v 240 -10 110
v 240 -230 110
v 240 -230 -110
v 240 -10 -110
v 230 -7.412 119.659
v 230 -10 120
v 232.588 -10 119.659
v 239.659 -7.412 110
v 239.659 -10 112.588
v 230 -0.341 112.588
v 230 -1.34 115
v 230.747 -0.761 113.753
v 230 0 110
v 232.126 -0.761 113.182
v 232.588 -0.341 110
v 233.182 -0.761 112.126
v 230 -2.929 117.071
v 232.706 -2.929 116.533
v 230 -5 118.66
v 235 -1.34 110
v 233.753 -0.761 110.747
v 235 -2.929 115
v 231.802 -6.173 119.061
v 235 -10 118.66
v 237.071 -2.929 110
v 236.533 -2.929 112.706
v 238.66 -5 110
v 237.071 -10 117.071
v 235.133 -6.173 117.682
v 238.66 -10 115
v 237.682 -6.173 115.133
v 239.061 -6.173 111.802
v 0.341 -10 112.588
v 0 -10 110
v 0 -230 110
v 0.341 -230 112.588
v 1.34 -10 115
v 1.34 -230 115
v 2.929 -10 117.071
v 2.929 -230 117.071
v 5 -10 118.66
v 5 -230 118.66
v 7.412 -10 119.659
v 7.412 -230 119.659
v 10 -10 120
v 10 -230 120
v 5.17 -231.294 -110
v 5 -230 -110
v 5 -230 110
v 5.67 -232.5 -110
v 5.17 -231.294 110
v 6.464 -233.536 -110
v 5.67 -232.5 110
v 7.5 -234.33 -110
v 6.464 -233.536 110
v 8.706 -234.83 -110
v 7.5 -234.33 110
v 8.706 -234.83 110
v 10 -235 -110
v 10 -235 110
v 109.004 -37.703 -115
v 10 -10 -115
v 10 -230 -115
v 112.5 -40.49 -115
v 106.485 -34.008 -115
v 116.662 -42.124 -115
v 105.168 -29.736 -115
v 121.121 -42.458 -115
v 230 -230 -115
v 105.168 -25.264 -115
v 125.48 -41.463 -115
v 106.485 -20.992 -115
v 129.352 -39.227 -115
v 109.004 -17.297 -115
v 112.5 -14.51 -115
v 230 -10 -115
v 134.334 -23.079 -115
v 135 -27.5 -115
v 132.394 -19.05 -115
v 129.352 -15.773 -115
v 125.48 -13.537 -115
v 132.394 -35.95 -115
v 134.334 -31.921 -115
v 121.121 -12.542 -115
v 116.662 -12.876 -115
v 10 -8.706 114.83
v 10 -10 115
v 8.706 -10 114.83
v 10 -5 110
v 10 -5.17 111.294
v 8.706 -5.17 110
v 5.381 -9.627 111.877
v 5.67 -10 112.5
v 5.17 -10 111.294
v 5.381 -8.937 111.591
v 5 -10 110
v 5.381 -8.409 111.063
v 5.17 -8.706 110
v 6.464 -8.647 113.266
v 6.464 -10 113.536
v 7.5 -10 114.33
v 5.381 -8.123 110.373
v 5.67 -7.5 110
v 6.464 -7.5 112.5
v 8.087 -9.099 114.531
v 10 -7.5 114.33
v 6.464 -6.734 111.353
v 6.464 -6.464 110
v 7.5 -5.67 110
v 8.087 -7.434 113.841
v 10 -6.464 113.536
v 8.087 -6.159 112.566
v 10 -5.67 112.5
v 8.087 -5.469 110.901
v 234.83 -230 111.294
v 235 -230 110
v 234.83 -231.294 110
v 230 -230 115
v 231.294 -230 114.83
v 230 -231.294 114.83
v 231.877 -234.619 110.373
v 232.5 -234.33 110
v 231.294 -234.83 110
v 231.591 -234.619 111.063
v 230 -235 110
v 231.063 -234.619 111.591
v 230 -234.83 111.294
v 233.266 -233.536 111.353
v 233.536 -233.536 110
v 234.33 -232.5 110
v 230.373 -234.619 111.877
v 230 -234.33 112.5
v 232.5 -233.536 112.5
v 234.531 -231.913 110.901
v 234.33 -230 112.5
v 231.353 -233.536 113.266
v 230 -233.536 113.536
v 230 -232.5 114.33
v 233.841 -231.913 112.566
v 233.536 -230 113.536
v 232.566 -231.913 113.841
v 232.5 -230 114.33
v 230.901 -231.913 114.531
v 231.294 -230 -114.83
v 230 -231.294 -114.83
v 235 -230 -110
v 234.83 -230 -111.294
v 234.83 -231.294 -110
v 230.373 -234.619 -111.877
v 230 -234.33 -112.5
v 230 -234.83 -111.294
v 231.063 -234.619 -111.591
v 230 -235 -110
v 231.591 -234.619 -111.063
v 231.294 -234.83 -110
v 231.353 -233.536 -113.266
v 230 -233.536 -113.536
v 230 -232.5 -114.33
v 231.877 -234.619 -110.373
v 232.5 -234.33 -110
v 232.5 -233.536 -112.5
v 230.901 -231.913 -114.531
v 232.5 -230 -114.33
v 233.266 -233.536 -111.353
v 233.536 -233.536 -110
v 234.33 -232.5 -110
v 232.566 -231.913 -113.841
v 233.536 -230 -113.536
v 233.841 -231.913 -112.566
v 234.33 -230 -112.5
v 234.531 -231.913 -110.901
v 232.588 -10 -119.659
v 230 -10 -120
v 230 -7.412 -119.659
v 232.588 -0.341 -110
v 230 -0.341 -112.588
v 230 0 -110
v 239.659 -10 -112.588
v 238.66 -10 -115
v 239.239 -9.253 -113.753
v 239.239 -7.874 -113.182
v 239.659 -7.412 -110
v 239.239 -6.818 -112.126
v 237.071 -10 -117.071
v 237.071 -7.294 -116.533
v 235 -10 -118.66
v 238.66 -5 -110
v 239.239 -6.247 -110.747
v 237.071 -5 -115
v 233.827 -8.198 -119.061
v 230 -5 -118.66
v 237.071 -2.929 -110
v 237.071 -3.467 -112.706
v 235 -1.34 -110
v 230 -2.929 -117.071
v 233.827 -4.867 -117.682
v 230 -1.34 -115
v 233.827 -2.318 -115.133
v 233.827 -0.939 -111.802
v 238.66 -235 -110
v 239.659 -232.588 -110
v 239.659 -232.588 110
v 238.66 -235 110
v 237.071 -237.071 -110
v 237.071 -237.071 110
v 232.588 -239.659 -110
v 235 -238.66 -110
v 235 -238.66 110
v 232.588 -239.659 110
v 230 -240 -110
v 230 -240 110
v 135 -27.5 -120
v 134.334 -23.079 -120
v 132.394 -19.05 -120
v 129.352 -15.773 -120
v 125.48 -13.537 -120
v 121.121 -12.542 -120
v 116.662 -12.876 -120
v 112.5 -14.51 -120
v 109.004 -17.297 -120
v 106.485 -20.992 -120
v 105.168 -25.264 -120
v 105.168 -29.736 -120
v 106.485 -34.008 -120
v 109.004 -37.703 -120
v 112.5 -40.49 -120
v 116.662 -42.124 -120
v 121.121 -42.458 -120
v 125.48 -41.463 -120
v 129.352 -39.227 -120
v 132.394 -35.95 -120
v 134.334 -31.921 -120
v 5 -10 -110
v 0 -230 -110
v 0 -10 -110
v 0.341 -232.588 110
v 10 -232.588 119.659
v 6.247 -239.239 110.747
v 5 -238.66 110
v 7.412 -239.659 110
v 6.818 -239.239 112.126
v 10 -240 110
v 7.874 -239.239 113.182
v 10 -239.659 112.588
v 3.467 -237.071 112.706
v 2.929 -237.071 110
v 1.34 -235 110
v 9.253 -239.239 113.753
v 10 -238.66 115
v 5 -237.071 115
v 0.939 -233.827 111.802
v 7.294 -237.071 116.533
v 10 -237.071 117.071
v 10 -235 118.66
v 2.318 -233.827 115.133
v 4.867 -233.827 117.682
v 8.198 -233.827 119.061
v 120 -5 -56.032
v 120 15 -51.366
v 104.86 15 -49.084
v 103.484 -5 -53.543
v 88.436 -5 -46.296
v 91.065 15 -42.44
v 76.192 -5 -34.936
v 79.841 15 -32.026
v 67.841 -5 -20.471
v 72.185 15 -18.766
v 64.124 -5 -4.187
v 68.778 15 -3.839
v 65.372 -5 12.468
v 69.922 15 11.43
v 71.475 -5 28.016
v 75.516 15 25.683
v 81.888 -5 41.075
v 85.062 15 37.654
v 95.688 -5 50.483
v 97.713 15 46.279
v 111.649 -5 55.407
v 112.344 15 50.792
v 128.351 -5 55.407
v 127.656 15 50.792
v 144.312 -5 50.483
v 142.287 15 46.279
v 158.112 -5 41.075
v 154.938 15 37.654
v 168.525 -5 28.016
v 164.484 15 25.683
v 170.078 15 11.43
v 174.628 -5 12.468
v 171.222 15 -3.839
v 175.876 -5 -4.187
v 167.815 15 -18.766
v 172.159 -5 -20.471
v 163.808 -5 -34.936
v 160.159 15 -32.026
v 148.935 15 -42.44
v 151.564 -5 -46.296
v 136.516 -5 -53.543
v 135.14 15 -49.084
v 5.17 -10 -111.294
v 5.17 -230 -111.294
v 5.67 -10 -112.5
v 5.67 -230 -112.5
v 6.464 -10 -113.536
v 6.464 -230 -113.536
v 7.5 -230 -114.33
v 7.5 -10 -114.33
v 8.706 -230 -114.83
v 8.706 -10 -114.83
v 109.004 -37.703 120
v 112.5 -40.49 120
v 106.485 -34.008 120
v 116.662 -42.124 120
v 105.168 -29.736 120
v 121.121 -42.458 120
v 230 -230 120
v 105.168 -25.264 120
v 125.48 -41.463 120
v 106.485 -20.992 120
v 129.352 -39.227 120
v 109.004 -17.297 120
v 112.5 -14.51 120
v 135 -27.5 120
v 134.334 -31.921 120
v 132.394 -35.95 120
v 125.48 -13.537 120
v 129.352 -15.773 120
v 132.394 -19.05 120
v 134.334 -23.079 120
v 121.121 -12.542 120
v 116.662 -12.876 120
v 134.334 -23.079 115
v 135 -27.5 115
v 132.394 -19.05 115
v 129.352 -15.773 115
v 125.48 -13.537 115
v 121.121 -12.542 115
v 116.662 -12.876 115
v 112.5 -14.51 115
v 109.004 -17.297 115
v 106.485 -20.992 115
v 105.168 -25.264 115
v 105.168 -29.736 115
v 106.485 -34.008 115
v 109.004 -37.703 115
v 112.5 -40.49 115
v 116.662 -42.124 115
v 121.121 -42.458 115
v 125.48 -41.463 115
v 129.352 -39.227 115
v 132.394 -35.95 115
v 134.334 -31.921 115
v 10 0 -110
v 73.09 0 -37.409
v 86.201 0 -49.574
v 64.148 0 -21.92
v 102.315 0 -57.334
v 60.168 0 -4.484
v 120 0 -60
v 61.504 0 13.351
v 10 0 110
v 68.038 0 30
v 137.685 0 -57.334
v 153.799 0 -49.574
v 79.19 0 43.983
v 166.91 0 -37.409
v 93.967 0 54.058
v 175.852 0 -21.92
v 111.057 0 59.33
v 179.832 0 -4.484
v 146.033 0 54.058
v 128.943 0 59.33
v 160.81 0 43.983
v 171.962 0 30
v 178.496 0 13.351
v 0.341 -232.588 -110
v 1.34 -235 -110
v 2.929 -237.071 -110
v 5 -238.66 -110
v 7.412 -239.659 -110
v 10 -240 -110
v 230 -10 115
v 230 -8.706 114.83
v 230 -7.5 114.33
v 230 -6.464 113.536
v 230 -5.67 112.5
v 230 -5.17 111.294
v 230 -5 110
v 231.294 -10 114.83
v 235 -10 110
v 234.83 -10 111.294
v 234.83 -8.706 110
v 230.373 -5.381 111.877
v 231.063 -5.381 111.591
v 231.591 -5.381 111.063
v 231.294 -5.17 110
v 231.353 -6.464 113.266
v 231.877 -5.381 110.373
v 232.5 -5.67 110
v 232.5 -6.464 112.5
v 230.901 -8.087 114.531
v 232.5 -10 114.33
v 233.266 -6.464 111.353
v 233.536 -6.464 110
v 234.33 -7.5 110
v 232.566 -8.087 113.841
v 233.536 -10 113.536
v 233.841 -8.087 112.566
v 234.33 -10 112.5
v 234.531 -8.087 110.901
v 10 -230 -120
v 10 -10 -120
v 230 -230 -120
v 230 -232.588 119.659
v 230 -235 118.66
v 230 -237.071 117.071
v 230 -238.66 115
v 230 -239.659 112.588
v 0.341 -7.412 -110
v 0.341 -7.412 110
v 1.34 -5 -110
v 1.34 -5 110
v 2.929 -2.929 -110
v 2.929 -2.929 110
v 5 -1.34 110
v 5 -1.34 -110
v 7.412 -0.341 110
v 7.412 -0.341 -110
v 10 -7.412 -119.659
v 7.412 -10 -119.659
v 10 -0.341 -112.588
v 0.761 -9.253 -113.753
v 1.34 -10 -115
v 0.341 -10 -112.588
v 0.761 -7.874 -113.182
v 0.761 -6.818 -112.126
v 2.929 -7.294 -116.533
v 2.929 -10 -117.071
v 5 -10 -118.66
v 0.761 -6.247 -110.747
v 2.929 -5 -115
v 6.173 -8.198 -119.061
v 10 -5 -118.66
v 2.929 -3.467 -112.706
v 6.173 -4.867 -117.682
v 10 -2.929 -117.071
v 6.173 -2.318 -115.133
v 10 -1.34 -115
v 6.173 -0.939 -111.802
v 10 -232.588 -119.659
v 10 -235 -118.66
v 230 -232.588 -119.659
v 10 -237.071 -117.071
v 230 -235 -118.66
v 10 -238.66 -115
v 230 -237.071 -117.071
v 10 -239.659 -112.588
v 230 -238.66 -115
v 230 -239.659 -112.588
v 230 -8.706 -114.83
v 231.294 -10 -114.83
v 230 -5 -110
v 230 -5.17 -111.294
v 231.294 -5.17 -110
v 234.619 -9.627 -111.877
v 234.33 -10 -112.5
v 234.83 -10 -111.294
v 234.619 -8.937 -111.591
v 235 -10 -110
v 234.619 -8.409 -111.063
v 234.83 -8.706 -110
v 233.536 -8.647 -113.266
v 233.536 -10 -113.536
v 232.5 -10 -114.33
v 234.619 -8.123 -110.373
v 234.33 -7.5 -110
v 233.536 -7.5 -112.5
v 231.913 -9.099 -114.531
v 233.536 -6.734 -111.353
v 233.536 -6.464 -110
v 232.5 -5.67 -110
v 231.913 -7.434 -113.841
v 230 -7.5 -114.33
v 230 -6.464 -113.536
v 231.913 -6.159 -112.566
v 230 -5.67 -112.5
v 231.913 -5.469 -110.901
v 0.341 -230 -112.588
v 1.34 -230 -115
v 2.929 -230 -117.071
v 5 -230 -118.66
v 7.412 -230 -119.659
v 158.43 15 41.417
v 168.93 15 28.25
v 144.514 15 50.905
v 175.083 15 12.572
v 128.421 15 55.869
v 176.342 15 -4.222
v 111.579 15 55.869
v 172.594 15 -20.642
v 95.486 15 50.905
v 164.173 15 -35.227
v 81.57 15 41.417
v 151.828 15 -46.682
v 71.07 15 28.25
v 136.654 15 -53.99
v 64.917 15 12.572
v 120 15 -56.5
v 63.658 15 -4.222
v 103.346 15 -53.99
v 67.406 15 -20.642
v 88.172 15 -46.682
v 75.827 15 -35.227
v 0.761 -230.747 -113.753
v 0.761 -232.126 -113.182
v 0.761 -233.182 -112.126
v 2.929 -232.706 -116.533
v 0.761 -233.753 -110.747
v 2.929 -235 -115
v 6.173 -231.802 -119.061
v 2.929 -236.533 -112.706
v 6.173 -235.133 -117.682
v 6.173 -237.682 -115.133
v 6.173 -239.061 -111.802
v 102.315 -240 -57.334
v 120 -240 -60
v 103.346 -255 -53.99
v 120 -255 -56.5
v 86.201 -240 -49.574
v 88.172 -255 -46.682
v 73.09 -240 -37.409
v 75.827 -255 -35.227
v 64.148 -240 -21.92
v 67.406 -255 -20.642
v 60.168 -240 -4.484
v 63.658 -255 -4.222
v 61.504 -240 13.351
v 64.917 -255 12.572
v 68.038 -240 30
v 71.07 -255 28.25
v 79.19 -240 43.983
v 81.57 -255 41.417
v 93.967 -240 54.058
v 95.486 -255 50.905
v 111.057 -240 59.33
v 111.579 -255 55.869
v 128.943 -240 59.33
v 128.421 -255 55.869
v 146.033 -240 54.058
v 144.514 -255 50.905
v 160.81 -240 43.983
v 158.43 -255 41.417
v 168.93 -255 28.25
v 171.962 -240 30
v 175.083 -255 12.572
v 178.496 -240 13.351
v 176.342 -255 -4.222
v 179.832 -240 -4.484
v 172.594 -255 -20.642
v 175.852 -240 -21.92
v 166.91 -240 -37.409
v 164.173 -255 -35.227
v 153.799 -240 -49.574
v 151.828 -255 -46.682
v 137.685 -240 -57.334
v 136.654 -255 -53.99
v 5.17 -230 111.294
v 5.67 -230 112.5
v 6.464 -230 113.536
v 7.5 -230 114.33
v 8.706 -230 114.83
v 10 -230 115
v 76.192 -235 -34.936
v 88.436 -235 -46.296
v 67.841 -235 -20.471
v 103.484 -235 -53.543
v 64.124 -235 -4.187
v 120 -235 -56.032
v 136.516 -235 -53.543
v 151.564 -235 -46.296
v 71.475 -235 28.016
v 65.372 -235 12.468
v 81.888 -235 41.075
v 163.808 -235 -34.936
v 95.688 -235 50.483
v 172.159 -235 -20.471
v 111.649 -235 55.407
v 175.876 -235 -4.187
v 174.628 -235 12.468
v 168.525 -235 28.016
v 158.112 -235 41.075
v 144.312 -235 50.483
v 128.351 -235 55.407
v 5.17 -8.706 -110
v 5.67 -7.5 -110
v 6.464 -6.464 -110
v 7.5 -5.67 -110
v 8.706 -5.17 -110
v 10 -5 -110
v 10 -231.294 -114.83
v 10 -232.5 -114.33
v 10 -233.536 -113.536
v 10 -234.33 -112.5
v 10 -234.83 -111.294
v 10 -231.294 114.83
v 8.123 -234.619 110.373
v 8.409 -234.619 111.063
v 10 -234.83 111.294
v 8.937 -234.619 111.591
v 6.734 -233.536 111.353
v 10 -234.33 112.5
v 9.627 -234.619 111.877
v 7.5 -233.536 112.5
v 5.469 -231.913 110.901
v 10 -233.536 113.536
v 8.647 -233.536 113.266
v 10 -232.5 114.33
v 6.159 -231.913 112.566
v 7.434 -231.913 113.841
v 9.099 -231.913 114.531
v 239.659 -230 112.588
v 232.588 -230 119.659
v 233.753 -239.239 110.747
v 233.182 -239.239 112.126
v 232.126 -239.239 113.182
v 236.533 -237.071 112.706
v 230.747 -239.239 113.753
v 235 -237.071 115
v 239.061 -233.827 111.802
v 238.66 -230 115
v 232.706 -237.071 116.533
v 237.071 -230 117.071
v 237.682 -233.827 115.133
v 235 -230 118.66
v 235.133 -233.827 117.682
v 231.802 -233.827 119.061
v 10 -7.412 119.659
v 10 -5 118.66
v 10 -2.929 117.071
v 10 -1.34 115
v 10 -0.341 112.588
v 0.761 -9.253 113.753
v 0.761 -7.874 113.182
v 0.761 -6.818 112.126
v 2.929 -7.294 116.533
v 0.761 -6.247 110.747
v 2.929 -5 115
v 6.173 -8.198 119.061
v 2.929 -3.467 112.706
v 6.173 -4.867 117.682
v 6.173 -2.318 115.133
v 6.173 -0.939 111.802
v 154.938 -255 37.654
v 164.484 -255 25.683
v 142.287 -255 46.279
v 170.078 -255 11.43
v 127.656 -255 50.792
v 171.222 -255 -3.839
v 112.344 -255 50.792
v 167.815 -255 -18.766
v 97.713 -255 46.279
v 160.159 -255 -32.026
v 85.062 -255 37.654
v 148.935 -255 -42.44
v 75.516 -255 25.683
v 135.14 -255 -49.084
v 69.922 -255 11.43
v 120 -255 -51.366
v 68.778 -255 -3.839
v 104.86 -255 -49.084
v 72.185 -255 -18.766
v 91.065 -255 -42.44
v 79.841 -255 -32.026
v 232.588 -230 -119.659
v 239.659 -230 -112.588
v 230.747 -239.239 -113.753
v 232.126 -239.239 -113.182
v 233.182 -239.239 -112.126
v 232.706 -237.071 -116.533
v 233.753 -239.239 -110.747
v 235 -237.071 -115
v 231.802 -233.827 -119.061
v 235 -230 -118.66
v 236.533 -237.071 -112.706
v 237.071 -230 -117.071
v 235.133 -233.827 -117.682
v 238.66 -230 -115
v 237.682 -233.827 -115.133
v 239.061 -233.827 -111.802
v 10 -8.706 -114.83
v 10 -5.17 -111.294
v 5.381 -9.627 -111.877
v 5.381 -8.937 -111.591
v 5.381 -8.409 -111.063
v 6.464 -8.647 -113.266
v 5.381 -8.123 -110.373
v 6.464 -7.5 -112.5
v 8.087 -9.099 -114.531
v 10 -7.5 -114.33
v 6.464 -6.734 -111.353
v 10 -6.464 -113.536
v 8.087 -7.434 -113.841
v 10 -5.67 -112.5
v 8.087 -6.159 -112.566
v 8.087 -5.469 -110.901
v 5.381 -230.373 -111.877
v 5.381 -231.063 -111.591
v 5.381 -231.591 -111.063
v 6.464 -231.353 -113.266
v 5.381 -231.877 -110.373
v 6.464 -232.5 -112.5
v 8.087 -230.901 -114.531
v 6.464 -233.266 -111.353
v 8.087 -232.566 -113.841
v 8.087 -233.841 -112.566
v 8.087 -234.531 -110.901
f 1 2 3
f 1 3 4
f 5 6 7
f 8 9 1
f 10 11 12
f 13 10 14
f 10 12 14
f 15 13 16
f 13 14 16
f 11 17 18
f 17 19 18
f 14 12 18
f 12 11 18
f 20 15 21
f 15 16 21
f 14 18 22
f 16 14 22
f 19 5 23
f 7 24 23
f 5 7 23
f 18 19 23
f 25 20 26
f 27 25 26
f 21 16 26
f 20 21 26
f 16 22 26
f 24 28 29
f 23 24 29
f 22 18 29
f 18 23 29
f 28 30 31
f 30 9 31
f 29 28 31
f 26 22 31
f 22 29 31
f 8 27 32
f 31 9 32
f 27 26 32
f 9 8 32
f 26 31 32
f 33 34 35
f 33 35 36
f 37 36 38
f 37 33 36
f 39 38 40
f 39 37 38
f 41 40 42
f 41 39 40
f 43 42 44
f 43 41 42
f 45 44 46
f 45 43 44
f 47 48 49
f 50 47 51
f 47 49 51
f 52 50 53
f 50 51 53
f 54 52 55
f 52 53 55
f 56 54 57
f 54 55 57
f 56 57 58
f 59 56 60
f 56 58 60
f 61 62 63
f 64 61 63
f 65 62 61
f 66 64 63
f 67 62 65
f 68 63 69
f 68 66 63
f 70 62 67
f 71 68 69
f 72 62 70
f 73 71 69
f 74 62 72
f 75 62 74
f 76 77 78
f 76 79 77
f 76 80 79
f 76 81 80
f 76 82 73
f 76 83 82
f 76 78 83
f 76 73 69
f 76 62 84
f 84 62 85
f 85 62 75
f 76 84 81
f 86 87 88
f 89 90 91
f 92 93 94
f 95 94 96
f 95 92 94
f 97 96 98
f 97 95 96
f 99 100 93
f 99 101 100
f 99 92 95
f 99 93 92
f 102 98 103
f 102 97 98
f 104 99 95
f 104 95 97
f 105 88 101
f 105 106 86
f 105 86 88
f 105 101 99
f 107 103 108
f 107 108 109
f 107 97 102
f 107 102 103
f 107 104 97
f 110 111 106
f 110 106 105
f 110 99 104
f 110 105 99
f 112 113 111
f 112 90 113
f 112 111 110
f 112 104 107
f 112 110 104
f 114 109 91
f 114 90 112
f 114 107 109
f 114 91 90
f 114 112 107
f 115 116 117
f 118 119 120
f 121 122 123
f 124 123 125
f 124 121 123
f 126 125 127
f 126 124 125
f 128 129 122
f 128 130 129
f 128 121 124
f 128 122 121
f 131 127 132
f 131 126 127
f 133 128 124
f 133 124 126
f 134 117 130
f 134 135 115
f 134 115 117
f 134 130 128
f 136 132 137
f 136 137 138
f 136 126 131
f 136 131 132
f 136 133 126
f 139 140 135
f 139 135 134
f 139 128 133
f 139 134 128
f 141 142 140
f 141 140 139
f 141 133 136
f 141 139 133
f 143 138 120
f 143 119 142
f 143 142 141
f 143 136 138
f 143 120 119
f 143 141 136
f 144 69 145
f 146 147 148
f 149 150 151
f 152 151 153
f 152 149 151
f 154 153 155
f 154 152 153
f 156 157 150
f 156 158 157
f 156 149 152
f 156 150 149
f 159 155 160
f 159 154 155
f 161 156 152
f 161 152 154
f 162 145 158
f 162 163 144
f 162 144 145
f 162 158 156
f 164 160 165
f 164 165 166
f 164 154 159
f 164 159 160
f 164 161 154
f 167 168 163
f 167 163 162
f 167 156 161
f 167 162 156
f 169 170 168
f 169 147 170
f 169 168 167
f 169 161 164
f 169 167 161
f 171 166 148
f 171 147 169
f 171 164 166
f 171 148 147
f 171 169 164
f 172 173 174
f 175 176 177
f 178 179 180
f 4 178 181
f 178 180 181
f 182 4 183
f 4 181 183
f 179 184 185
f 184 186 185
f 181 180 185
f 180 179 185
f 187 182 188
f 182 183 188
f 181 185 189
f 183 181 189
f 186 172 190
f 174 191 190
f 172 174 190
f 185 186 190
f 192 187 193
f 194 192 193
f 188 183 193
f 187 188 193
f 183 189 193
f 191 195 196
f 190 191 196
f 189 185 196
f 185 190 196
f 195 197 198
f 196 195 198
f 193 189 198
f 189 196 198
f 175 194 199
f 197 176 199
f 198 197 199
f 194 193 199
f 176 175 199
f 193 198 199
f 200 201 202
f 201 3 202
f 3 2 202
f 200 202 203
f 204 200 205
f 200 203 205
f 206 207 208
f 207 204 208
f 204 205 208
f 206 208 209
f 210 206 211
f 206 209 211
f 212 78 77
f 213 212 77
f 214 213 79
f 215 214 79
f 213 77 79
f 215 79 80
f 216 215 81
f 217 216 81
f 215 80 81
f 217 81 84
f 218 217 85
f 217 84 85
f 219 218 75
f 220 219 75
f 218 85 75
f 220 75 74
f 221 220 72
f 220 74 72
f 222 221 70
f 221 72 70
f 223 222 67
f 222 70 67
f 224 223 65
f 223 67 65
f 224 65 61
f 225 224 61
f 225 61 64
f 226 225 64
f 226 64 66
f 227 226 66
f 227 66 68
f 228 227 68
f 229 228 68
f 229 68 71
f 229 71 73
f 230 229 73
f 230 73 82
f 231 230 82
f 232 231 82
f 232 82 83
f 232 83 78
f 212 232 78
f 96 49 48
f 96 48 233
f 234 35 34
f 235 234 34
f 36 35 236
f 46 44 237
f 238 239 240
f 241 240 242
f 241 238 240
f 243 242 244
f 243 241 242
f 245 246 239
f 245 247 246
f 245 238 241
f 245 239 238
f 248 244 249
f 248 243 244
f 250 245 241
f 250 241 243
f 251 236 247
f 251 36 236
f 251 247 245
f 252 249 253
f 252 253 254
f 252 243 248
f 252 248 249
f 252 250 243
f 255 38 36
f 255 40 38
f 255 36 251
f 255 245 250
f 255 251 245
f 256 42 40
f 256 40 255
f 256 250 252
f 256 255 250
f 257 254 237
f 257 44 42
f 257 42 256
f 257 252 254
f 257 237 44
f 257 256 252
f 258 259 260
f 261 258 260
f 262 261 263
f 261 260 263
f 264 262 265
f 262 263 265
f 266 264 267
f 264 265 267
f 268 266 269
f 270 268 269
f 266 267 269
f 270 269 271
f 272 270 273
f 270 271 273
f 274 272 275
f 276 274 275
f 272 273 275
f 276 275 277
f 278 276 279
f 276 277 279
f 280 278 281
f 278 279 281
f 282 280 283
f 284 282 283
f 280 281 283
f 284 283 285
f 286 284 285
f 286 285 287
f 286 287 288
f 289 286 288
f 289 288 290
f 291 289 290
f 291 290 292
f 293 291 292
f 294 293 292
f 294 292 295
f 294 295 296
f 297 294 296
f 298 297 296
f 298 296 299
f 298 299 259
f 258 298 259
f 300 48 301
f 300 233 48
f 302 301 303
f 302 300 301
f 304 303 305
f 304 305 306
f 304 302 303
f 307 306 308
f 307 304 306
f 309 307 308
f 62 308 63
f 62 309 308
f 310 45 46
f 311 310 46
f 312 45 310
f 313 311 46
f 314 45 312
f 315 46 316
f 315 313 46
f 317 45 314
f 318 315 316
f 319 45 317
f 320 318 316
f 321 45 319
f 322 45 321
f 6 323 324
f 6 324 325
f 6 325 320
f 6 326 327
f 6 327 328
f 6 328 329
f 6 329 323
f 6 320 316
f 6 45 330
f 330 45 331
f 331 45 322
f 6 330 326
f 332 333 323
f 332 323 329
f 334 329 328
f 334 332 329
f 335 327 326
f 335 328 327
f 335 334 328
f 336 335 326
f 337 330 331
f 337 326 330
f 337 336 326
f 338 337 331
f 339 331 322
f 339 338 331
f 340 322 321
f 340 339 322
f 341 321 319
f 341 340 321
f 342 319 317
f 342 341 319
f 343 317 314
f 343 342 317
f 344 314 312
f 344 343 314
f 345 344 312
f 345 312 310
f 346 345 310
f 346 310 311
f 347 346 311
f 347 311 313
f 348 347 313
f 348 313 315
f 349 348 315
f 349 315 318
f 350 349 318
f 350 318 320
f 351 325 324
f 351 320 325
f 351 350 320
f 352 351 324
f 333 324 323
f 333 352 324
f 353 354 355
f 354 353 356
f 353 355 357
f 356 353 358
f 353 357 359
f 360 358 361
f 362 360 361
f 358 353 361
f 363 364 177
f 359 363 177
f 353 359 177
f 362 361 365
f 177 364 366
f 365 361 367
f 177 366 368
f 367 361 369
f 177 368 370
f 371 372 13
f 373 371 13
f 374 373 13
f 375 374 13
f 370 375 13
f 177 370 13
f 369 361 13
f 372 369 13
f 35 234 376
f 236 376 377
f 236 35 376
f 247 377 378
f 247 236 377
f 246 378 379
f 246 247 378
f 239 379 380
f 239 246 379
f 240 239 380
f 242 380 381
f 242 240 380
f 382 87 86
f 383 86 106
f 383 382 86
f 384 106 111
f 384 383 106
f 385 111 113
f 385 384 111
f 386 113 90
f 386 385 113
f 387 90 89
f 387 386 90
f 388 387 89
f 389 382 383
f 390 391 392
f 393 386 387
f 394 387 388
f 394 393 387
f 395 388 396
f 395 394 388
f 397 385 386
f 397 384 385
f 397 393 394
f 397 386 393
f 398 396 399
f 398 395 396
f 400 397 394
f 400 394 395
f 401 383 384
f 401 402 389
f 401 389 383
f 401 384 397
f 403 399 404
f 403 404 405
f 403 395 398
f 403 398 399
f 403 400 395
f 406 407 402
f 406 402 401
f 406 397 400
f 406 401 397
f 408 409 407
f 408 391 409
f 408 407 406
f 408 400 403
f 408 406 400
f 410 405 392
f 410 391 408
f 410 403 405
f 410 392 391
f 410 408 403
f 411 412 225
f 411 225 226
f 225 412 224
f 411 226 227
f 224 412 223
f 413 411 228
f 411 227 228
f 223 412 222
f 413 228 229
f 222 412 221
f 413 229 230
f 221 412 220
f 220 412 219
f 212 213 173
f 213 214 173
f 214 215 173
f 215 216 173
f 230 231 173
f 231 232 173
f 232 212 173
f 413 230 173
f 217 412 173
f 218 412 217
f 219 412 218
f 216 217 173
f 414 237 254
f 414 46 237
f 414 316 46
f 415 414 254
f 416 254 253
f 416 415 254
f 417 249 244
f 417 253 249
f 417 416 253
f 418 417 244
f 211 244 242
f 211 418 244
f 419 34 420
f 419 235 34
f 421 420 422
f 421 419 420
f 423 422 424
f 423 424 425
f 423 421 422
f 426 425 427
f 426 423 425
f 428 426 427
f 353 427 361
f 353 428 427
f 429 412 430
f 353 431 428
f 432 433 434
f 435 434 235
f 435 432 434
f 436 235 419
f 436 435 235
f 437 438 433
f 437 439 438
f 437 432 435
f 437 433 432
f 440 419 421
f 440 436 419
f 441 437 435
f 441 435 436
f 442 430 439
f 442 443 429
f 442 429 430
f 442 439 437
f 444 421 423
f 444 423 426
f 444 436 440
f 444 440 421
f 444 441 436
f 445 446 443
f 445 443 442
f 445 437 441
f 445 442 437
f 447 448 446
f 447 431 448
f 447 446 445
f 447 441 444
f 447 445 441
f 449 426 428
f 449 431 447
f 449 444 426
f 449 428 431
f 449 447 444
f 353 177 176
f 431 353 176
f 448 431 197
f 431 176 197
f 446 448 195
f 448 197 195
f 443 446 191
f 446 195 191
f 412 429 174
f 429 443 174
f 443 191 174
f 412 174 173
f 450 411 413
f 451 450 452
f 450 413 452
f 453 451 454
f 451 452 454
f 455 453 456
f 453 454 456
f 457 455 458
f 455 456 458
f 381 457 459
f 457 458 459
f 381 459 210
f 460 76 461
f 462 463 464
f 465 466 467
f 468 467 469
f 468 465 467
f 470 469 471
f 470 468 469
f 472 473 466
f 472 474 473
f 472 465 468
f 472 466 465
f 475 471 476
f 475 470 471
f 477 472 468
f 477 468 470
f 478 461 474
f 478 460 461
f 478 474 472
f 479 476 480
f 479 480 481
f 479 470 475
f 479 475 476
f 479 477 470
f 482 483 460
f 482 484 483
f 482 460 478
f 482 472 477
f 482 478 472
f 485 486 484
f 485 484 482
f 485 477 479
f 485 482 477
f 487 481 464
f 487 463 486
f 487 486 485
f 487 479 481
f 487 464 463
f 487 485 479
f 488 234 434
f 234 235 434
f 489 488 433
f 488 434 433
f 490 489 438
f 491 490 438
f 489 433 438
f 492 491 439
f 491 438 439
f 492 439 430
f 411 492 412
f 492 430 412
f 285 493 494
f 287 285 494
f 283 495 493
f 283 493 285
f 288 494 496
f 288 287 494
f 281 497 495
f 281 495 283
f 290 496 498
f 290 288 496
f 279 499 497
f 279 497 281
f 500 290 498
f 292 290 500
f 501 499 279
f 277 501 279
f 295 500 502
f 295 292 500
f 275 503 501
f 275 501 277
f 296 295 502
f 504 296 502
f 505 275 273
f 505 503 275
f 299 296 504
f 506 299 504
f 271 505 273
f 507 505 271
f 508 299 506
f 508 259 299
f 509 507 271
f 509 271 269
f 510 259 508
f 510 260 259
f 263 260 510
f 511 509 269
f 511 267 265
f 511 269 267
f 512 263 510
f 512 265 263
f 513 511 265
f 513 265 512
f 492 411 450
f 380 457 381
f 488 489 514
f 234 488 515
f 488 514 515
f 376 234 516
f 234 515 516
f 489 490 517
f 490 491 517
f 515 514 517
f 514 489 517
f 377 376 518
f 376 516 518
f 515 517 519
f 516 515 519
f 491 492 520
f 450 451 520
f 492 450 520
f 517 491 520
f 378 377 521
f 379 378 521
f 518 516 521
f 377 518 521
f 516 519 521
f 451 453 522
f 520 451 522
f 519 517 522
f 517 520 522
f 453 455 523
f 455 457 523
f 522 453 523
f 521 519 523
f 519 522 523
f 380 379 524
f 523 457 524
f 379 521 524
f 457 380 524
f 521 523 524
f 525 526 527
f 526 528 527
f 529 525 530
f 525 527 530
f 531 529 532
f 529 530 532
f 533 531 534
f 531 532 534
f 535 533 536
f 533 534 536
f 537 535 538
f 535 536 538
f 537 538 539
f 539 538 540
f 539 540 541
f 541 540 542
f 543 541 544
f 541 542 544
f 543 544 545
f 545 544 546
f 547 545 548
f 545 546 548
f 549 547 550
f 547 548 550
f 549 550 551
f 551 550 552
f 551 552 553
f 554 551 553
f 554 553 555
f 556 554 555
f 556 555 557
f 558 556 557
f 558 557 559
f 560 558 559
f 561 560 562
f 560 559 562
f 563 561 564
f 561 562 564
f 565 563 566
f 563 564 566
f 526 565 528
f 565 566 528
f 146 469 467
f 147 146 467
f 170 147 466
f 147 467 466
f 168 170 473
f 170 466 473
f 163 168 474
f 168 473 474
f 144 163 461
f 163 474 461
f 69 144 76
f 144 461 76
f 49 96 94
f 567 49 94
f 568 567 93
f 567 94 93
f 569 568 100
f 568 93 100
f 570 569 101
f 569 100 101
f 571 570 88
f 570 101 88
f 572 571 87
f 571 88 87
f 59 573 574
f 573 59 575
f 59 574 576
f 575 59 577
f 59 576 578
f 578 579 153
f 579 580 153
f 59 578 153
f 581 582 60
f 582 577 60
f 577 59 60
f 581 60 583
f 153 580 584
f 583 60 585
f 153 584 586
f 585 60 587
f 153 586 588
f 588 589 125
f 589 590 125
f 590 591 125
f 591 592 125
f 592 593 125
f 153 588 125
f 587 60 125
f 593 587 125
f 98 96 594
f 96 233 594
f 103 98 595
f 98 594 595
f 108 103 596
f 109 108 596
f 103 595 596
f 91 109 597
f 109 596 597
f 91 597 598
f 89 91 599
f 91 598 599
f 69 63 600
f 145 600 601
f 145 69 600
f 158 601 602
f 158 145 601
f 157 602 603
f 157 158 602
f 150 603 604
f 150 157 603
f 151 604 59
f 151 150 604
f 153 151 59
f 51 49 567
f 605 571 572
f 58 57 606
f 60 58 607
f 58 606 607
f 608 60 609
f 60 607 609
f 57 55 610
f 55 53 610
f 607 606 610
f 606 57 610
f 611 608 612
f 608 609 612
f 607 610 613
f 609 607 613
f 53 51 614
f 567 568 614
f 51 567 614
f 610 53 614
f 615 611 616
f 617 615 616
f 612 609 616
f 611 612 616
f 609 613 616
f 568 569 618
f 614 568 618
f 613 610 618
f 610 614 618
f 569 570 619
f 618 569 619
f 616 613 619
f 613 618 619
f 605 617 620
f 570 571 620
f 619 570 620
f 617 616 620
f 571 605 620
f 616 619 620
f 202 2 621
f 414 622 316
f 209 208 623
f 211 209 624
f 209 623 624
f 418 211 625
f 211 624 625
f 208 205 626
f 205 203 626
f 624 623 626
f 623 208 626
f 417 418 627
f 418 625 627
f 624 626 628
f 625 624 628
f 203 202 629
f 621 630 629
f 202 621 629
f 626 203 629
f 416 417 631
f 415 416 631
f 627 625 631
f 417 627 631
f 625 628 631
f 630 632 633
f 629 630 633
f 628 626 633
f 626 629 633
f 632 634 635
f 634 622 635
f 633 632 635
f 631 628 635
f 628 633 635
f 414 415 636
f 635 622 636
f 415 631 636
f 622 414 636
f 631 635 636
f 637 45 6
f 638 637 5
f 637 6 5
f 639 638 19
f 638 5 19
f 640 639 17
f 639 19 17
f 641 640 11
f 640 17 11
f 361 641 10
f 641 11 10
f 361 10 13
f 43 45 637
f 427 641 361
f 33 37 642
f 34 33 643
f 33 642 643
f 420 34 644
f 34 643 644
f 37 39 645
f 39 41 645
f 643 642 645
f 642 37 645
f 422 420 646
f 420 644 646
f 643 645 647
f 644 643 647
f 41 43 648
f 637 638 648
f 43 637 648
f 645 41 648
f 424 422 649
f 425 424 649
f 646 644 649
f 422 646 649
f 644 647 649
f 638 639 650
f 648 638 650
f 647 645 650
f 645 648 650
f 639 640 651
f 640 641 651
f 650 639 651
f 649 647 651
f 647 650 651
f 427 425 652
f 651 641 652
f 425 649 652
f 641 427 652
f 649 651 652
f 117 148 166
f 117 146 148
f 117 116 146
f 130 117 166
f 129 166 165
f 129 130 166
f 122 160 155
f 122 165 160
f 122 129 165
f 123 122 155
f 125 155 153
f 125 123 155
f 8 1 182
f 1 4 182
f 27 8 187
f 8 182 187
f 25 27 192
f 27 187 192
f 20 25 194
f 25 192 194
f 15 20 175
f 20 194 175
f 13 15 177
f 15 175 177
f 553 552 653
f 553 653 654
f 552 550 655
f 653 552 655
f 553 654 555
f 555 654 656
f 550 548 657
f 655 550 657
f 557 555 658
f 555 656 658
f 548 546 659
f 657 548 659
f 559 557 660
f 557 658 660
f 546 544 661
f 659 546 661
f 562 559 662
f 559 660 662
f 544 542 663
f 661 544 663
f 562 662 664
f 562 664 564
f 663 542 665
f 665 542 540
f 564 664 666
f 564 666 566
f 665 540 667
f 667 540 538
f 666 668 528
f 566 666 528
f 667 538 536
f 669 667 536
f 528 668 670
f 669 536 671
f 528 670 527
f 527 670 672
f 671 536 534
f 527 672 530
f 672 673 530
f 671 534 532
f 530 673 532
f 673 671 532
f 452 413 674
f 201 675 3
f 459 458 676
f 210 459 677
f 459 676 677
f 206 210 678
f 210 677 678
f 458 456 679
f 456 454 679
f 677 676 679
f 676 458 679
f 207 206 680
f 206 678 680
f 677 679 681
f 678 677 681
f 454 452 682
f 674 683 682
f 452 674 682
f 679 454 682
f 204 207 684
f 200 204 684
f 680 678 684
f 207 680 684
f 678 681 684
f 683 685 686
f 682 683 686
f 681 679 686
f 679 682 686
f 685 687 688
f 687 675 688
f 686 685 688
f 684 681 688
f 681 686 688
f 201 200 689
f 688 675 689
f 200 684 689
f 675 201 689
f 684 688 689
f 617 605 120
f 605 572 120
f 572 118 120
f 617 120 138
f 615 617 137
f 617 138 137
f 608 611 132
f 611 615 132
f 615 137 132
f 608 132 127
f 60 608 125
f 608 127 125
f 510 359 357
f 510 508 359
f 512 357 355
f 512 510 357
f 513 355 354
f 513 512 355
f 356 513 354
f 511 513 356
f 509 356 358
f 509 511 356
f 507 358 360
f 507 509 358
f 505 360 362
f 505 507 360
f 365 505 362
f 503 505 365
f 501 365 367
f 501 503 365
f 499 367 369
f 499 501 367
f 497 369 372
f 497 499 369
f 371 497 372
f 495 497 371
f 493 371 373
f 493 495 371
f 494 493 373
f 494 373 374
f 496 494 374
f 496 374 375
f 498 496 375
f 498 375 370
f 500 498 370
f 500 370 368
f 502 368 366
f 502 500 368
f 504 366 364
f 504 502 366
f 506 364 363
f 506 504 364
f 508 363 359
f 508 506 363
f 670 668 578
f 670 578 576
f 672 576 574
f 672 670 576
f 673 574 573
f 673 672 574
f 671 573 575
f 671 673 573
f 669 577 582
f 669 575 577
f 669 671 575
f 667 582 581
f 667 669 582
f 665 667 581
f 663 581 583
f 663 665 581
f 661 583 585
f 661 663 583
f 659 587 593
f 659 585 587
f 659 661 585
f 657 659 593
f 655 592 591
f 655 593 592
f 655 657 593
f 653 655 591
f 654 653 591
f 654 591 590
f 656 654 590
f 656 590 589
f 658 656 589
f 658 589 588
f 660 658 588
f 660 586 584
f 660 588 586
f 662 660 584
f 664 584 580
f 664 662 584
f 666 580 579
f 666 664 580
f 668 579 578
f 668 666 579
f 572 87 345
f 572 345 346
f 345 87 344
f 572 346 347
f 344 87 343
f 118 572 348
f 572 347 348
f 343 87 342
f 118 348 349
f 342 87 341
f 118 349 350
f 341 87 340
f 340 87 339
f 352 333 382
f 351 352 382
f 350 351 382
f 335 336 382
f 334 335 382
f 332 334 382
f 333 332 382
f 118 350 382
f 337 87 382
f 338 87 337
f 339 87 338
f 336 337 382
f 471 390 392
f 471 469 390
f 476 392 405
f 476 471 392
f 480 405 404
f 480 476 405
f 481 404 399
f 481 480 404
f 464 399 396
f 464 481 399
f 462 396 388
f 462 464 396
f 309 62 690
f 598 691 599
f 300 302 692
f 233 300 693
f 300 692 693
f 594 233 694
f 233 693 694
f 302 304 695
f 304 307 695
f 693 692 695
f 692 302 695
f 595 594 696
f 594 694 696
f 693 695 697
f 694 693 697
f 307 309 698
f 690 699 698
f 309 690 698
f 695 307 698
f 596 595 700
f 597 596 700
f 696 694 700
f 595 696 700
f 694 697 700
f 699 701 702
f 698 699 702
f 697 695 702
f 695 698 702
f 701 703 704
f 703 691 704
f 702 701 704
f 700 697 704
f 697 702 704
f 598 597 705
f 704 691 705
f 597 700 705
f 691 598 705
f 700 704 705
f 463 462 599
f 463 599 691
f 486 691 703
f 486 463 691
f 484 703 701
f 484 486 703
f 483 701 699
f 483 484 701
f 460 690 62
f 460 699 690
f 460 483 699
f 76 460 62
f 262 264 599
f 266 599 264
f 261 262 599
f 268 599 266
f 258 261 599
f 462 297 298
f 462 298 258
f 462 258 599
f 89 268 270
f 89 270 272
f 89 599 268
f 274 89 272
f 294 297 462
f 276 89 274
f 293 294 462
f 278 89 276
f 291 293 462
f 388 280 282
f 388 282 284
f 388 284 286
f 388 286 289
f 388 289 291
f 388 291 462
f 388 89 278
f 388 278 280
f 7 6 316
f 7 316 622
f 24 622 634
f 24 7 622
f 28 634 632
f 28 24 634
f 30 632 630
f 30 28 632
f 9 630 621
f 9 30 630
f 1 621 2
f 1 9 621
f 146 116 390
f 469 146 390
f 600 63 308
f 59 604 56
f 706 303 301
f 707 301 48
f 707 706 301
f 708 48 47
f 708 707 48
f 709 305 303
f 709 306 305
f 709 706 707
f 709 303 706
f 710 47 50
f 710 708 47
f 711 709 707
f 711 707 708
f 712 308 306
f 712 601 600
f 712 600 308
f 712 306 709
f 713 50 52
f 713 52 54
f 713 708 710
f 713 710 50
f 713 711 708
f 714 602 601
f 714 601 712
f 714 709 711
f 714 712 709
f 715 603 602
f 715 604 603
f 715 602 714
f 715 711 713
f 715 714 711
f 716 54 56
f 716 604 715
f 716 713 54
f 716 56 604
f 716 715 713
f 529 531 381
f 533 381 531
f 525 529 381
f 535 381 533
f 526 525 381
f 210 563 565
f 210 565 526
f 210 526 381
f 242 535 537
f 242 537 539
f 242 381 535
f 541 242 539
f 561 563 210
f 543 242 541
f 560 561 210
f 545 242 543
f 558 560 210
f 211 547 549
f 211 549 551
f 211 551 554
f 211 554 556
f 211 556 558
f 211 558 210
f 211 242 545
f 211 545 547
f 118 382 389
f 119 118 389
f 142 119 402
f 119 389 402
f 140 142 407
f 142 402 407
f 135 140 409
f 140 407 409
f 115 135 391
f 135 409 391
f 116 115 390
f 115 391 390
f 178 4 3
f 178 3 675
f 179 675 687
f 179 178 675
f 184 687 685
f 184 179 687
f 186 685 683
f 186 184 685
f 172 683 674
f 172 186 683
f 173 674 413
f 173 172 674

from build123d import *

# Parameters (mm, degrees)
SKETCH1_W               = 480
SKETCH1_H               = 480
BOSS_EXTRUDE1_DEPTH     = 240
FILLET1_R               = 20
SHELL1_T                = -10
SKETCH3_R               = 30
CUT_EXTRUDE1_DEPTH      = 741.337760755
CUT_EXTRUDE1_DEPTH_BACK = 741.337760755
SCALE1_SCALE            = 0.5


with BuildPart() as part:
    # Sketch1 → Boss-Extrude1 (new, symmetric)
    with BuildSketch(Plane.XY):
        with Locations((240, -240)):
            Rectangle(SKETCH1_W, SKETCH1_H)
    extrude(amount=BOSS_EXTRUDE1_DEPTH, both=True)

    # Fillet1
    fillet1_edges = [part.edges().sort_by_distance(p)[0] for p in [
        (480, -240, 240),
        (240, 0, 240),
        (0, -240, 240),
        (240, 0, -240),
        (480, -240, -240),
        (240, -480, -240),
        (0, -240, -240),
        (0, 0, 0),
        (480, 0, 0),
        (480, -480, 0),
        (0, -480, 0),
        (240, -480, 240),
    ]]
    fillet(fillet1_edges, radius=FILLET1_R)

    # Sketch2 → Revolve1 (revolve)
    with BuildSketch(Plane.XY, mode=Mode.PRIVATE) as revolve1_sk:
        Polygon((240, 0), (360, 0), (353, 30), (240, 30), align=None)
        Polygon((360, -480), (353, -510), (240, -510), (240, -480), align=None)
    revolve(revolve1_sk.sketch.rotate(Axis((240, 0, 0), (0, 1, 0)), 90), axis=Axis((240, 0, 0), (0, 1, 0)))

    # Shell1
    shell1_openings = [part.faces().sort_by_distance(p)[0] for p in [
        (240, 30, 0),
        (240, -510, 0),
    ]]
    offset(amount=SHELL1_T, openings=shell1_openings, kind=Kind.INTERSECTION)

    # Sketch3 → Cut-Extrude1 (cut, two sides)
    with BuildSketch(Plane.XY) as cut_extrude1_sk:
        with Locations((240, -55)):
            Circle(SKETCH3_R)
    extrude(amount=CUT_EXTRUDE1_DEPTH, mode=Mode.SUBTRACT)
    extrude(cut_extrude1_sk.sketch, amount=-CUT_EXTRUDE1_DEPTH_BACK, mode=Mode.SUBTRACT)


with BuildPart() as part_1:
    # Scale1: scaled about (0, 0, 0)
    add(part.part.scale(SCALE1_SCALE))


solid = part_1.part
